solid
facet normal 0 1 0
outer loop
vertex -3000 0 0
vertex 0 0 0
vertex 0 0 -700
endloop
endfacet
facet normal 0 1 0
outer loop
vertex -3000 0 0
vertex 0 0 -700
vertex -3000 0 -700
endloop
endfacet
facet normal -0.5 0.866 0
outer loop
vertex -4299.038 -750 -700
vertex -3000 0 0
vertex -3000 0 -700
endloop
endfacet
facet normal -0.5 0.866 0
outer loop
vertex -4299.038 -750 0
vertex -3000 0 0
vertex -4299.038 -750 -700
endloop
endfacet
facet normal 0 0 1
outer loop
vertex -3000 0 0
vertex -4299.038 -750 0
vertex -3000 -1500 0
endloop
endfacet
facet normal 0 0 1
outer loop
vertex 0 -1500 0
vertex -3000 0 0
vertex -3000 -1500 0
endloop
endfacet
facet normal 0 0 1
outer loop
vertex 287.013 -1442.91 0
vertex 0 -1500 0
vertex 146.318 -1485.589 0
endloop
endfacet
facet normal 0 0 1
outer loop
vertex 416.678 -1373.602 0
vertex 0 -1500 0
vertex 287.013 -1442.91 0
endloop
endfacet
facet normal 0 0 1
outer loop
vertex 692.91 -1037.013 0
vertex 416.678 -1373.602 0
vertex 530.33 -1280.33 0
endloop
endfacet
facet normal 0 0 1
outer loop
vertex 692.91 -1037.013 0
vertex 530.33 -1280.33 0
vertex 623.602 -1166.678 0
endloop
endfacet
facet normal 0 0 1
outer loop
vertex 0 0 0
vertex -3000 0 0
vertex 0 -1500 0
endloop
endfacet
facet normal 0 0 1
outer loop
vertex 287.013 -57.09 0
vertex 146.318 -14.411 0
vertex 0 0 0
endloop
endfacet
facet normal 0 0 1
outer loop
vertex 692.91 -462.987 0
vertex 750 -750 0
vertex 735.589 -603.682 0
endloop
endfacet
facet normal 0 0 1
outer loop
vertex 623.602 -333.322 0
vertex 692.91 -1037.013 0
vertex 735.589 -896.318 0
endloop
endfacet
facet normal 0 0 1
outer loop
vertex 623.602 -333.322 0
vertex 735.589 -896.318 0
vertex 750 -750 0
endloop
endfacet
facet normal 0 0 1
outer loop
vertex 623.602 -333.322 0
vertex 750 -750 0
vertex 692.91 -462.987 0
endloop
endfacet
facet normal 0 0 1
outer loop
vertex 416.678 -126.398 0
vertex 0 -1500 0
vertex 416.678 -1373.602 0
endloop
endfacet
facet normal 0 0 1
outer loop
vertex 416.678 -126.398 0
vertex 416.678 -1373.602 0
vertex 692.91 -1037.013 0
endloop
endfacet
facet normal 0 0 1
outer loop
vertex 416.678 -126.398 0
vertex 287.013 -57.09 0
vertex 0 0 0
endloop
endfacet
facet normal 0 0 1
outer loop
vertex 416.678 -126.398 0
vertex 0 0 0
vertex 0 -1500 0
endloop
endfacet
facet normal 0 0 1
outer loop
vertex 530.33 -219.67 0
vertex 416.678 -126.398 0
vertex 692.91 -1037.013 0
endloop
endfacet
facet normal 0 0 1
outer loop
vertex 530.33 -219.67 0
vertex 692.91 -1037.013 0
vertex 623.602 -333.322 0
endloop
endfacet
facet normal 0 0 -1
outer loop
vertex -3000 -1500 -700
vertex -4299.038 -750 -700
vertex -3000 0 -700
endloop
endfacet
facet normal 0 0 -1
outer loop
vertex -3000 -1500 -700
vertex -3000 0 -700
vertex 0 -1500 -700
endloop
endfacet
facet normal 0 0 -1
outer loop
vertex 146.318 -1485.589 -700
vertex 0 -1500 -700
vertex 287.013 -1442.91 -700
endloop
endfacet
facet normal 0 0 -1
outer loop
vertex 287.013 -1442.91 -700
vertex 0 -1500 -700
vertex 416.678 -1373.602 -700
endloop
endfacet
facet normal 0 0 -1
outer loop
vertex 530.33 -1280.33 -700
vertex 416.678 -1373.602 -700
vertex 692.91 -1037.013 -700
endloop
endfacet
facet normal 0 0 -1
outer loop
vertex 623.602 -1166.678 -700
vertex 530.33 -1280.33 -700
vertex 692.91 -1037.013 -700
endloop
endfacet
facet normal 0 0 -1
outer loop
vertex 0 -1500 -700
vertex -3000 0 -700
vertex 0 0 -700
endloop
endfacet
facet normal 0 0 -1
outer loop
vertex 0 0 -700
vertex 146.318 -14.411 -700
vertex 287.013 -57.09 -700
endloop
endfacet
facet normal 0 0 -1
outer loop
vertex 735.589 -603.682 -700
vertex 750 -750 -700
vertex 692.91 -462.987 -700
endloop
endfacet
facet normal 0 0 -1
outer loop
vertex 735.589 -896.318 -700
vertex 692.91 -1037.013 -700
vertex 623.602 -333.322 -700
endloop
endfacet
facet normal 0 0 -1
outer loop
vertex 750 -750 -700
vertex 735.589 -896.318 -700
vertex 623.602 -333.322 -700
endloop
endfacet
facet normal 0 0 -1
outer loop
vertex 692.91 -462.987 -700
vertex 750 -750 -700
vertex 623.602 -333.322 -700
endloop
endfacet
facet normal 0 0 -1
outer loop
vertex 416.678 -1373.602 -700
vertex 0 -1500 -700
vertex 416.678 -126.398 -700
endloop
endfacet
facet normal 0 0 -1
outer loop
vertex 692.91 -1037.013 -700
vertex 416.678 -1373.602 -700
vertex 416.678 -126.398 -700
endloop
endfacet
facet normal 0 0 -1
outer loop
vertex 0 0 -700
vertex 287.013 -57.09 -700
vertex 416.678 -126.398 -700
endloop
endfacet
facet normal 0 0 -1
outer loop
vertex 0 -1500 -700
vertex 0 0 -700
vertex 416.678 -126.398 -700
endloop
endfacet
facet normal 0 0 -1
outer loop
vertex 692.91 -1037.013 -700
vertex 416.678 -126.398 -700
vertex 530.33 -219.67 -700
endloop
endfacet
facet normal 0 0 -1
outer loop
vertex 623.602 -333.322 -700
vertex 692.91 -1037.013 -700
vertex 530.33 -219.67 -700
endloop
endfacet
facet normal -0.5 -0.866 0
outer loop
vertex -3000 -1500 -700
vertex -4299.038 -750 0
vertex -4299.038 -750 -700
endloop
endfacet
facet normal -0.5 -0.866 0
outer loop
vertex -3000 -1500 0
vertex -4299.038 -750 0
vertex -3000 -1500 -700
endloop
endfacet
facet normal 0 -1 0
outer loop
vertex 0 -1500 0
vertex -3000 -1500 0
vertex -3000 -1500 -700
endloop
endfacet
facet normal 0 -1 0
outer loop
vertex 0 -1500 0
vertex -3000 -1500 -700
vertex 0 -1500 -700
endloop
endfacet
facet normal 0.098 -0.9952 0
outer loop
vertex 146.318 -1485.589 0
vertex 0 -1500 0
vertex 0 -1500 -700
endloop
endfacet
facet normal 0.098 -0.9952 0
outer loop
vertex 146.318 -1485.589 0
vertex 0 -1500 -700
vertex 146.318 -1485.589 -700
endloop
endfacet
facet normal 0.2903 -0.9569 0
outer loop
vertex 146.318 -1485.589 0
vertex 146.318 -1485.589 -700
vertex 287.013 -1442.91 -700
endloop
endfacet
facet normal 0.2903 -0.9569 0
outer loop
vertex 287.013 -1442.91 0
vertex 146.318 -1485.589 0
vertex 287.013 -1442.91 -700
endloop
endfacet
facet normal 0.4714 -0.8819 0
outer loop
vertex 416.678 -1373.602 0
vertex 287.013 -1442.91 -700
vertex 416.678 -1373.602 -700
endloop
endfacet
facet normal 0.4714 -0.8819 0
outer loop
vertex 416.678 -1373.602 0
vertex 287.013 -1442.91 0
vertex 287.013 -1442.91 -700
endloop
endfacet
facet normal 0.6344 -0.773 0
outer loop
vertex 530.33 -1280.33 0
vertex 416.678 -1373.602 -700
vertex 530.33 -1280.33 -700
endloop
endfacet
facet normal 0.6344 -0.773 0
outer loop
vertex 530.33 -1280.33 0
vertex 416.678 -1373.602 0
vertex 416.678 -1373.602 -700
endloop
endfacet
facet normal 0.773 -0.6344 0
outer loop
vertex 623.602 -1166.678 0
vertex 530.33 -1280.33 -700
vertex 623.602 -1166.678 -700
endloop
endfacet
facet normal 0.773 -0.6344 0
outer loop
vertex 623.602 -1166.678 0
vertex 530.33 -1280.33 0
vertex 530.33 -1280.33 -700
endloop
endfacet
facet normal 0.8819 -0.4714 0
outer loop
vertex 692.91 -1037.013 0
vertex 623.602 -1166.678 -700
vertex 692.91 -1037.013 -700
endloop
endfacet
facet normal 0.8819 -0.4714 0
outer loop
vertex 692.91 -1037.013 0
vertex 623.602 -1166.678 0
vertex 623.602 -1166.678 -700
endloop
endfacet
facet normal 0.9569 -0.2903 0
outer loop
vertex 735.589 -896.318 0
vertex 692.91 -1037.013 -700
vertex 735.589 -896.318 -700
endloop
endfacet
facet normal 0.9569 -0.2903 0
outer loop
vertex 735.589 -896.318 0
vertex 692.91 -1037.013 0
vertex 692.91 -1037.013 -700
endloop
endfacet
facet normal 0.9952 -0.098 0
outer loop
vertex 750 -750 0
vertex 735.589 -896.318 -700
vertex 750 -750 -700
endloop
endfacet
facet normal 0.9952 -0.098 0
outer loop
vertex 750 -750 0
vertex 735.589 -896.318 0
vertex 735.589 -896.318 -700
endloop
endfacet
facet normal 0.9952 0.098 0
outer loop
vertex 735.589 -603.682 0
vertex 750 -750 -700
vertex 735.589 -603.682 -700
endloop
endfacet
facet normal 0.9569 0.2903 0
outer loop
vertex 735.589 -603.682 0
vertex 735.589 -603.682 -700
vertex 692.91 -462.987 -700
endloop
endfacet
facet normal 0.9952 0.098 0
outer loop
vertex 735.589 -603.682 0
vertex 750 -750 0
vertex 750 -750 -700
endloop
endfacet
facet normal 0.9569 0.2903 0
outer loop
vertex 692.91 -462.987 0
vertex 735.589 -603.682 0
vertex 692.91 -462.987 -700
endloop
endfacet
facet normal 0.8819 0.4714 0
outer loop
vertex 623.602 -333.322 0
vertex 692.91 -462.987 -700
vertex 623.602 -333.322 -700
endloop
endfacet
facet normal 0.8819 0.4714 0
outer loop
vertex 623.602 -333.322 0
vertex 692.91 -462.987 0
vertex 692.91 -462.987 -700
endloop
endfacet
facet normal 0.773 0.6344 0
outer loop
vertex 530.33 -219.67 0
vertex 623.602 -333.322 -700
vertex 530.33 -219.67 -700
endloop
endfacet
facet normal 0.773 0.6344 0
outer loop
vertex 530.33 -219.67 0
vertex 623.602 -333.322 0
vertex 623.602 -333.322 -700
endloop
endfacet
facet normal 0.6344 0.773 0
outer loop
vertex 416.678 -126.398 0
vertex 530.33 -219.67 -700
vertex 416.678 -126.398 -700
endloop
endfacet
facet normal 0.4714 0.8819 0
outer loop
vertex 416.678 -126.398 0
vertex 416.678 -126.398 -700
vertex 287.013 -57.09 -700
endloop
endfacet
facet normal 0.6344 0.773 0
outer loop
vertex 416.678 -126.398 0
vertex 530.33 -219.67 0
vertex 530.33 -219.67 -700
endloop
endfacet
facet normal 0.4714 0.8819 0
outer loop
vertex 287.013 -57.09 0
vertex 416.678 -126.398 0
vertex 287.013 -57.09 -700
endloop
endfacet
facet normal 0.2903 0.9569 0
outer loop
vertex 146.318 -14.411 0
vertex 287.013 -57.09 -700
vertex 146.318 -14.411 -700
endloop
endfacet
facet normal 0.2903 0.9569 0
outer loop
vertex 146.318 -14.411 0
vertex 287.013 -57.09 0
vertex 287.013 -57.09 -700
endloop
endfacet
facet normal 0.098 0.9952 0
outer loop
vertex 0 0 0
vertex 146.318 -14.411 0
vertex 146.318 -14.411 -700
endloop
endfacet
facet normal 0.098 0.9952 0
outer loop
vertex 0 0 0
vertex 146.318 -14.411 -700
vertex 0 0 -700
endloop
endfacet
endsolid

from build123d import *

# Parameters (mm, degrees)
F1_DEPTH = 1200
F2_DEPTH = 500


with BuildPart() as f1:
    # F0 (on Top) → F1 (new body)
    with BuildSketch(Plane.XY):
        with BuildLine():
            ThreePointArc((0, -1500), (750, -750), (0, 0))
            Line((0, 0), (-3000, 0))
            Line((-3000, 0), (-4299.0381056767, -750))
            Line((-4299.0381056767, -750), (-3000, -1500))
            Line((-3000, -1500), (0, -1500))
        make_face()
    extrude(amount=-F1_DEPTH)

    # F2 (cut): a face of the model
    f2_faces = [f1.faces().sort_by_distance(p)[0] for p in [
        (-1543.5183910137, -750, -1200),
    ]]
    extrude(f2_faces, amount=-F2_DEPTH, mode=Mode.SUBTRACT)


solid = f1.part
